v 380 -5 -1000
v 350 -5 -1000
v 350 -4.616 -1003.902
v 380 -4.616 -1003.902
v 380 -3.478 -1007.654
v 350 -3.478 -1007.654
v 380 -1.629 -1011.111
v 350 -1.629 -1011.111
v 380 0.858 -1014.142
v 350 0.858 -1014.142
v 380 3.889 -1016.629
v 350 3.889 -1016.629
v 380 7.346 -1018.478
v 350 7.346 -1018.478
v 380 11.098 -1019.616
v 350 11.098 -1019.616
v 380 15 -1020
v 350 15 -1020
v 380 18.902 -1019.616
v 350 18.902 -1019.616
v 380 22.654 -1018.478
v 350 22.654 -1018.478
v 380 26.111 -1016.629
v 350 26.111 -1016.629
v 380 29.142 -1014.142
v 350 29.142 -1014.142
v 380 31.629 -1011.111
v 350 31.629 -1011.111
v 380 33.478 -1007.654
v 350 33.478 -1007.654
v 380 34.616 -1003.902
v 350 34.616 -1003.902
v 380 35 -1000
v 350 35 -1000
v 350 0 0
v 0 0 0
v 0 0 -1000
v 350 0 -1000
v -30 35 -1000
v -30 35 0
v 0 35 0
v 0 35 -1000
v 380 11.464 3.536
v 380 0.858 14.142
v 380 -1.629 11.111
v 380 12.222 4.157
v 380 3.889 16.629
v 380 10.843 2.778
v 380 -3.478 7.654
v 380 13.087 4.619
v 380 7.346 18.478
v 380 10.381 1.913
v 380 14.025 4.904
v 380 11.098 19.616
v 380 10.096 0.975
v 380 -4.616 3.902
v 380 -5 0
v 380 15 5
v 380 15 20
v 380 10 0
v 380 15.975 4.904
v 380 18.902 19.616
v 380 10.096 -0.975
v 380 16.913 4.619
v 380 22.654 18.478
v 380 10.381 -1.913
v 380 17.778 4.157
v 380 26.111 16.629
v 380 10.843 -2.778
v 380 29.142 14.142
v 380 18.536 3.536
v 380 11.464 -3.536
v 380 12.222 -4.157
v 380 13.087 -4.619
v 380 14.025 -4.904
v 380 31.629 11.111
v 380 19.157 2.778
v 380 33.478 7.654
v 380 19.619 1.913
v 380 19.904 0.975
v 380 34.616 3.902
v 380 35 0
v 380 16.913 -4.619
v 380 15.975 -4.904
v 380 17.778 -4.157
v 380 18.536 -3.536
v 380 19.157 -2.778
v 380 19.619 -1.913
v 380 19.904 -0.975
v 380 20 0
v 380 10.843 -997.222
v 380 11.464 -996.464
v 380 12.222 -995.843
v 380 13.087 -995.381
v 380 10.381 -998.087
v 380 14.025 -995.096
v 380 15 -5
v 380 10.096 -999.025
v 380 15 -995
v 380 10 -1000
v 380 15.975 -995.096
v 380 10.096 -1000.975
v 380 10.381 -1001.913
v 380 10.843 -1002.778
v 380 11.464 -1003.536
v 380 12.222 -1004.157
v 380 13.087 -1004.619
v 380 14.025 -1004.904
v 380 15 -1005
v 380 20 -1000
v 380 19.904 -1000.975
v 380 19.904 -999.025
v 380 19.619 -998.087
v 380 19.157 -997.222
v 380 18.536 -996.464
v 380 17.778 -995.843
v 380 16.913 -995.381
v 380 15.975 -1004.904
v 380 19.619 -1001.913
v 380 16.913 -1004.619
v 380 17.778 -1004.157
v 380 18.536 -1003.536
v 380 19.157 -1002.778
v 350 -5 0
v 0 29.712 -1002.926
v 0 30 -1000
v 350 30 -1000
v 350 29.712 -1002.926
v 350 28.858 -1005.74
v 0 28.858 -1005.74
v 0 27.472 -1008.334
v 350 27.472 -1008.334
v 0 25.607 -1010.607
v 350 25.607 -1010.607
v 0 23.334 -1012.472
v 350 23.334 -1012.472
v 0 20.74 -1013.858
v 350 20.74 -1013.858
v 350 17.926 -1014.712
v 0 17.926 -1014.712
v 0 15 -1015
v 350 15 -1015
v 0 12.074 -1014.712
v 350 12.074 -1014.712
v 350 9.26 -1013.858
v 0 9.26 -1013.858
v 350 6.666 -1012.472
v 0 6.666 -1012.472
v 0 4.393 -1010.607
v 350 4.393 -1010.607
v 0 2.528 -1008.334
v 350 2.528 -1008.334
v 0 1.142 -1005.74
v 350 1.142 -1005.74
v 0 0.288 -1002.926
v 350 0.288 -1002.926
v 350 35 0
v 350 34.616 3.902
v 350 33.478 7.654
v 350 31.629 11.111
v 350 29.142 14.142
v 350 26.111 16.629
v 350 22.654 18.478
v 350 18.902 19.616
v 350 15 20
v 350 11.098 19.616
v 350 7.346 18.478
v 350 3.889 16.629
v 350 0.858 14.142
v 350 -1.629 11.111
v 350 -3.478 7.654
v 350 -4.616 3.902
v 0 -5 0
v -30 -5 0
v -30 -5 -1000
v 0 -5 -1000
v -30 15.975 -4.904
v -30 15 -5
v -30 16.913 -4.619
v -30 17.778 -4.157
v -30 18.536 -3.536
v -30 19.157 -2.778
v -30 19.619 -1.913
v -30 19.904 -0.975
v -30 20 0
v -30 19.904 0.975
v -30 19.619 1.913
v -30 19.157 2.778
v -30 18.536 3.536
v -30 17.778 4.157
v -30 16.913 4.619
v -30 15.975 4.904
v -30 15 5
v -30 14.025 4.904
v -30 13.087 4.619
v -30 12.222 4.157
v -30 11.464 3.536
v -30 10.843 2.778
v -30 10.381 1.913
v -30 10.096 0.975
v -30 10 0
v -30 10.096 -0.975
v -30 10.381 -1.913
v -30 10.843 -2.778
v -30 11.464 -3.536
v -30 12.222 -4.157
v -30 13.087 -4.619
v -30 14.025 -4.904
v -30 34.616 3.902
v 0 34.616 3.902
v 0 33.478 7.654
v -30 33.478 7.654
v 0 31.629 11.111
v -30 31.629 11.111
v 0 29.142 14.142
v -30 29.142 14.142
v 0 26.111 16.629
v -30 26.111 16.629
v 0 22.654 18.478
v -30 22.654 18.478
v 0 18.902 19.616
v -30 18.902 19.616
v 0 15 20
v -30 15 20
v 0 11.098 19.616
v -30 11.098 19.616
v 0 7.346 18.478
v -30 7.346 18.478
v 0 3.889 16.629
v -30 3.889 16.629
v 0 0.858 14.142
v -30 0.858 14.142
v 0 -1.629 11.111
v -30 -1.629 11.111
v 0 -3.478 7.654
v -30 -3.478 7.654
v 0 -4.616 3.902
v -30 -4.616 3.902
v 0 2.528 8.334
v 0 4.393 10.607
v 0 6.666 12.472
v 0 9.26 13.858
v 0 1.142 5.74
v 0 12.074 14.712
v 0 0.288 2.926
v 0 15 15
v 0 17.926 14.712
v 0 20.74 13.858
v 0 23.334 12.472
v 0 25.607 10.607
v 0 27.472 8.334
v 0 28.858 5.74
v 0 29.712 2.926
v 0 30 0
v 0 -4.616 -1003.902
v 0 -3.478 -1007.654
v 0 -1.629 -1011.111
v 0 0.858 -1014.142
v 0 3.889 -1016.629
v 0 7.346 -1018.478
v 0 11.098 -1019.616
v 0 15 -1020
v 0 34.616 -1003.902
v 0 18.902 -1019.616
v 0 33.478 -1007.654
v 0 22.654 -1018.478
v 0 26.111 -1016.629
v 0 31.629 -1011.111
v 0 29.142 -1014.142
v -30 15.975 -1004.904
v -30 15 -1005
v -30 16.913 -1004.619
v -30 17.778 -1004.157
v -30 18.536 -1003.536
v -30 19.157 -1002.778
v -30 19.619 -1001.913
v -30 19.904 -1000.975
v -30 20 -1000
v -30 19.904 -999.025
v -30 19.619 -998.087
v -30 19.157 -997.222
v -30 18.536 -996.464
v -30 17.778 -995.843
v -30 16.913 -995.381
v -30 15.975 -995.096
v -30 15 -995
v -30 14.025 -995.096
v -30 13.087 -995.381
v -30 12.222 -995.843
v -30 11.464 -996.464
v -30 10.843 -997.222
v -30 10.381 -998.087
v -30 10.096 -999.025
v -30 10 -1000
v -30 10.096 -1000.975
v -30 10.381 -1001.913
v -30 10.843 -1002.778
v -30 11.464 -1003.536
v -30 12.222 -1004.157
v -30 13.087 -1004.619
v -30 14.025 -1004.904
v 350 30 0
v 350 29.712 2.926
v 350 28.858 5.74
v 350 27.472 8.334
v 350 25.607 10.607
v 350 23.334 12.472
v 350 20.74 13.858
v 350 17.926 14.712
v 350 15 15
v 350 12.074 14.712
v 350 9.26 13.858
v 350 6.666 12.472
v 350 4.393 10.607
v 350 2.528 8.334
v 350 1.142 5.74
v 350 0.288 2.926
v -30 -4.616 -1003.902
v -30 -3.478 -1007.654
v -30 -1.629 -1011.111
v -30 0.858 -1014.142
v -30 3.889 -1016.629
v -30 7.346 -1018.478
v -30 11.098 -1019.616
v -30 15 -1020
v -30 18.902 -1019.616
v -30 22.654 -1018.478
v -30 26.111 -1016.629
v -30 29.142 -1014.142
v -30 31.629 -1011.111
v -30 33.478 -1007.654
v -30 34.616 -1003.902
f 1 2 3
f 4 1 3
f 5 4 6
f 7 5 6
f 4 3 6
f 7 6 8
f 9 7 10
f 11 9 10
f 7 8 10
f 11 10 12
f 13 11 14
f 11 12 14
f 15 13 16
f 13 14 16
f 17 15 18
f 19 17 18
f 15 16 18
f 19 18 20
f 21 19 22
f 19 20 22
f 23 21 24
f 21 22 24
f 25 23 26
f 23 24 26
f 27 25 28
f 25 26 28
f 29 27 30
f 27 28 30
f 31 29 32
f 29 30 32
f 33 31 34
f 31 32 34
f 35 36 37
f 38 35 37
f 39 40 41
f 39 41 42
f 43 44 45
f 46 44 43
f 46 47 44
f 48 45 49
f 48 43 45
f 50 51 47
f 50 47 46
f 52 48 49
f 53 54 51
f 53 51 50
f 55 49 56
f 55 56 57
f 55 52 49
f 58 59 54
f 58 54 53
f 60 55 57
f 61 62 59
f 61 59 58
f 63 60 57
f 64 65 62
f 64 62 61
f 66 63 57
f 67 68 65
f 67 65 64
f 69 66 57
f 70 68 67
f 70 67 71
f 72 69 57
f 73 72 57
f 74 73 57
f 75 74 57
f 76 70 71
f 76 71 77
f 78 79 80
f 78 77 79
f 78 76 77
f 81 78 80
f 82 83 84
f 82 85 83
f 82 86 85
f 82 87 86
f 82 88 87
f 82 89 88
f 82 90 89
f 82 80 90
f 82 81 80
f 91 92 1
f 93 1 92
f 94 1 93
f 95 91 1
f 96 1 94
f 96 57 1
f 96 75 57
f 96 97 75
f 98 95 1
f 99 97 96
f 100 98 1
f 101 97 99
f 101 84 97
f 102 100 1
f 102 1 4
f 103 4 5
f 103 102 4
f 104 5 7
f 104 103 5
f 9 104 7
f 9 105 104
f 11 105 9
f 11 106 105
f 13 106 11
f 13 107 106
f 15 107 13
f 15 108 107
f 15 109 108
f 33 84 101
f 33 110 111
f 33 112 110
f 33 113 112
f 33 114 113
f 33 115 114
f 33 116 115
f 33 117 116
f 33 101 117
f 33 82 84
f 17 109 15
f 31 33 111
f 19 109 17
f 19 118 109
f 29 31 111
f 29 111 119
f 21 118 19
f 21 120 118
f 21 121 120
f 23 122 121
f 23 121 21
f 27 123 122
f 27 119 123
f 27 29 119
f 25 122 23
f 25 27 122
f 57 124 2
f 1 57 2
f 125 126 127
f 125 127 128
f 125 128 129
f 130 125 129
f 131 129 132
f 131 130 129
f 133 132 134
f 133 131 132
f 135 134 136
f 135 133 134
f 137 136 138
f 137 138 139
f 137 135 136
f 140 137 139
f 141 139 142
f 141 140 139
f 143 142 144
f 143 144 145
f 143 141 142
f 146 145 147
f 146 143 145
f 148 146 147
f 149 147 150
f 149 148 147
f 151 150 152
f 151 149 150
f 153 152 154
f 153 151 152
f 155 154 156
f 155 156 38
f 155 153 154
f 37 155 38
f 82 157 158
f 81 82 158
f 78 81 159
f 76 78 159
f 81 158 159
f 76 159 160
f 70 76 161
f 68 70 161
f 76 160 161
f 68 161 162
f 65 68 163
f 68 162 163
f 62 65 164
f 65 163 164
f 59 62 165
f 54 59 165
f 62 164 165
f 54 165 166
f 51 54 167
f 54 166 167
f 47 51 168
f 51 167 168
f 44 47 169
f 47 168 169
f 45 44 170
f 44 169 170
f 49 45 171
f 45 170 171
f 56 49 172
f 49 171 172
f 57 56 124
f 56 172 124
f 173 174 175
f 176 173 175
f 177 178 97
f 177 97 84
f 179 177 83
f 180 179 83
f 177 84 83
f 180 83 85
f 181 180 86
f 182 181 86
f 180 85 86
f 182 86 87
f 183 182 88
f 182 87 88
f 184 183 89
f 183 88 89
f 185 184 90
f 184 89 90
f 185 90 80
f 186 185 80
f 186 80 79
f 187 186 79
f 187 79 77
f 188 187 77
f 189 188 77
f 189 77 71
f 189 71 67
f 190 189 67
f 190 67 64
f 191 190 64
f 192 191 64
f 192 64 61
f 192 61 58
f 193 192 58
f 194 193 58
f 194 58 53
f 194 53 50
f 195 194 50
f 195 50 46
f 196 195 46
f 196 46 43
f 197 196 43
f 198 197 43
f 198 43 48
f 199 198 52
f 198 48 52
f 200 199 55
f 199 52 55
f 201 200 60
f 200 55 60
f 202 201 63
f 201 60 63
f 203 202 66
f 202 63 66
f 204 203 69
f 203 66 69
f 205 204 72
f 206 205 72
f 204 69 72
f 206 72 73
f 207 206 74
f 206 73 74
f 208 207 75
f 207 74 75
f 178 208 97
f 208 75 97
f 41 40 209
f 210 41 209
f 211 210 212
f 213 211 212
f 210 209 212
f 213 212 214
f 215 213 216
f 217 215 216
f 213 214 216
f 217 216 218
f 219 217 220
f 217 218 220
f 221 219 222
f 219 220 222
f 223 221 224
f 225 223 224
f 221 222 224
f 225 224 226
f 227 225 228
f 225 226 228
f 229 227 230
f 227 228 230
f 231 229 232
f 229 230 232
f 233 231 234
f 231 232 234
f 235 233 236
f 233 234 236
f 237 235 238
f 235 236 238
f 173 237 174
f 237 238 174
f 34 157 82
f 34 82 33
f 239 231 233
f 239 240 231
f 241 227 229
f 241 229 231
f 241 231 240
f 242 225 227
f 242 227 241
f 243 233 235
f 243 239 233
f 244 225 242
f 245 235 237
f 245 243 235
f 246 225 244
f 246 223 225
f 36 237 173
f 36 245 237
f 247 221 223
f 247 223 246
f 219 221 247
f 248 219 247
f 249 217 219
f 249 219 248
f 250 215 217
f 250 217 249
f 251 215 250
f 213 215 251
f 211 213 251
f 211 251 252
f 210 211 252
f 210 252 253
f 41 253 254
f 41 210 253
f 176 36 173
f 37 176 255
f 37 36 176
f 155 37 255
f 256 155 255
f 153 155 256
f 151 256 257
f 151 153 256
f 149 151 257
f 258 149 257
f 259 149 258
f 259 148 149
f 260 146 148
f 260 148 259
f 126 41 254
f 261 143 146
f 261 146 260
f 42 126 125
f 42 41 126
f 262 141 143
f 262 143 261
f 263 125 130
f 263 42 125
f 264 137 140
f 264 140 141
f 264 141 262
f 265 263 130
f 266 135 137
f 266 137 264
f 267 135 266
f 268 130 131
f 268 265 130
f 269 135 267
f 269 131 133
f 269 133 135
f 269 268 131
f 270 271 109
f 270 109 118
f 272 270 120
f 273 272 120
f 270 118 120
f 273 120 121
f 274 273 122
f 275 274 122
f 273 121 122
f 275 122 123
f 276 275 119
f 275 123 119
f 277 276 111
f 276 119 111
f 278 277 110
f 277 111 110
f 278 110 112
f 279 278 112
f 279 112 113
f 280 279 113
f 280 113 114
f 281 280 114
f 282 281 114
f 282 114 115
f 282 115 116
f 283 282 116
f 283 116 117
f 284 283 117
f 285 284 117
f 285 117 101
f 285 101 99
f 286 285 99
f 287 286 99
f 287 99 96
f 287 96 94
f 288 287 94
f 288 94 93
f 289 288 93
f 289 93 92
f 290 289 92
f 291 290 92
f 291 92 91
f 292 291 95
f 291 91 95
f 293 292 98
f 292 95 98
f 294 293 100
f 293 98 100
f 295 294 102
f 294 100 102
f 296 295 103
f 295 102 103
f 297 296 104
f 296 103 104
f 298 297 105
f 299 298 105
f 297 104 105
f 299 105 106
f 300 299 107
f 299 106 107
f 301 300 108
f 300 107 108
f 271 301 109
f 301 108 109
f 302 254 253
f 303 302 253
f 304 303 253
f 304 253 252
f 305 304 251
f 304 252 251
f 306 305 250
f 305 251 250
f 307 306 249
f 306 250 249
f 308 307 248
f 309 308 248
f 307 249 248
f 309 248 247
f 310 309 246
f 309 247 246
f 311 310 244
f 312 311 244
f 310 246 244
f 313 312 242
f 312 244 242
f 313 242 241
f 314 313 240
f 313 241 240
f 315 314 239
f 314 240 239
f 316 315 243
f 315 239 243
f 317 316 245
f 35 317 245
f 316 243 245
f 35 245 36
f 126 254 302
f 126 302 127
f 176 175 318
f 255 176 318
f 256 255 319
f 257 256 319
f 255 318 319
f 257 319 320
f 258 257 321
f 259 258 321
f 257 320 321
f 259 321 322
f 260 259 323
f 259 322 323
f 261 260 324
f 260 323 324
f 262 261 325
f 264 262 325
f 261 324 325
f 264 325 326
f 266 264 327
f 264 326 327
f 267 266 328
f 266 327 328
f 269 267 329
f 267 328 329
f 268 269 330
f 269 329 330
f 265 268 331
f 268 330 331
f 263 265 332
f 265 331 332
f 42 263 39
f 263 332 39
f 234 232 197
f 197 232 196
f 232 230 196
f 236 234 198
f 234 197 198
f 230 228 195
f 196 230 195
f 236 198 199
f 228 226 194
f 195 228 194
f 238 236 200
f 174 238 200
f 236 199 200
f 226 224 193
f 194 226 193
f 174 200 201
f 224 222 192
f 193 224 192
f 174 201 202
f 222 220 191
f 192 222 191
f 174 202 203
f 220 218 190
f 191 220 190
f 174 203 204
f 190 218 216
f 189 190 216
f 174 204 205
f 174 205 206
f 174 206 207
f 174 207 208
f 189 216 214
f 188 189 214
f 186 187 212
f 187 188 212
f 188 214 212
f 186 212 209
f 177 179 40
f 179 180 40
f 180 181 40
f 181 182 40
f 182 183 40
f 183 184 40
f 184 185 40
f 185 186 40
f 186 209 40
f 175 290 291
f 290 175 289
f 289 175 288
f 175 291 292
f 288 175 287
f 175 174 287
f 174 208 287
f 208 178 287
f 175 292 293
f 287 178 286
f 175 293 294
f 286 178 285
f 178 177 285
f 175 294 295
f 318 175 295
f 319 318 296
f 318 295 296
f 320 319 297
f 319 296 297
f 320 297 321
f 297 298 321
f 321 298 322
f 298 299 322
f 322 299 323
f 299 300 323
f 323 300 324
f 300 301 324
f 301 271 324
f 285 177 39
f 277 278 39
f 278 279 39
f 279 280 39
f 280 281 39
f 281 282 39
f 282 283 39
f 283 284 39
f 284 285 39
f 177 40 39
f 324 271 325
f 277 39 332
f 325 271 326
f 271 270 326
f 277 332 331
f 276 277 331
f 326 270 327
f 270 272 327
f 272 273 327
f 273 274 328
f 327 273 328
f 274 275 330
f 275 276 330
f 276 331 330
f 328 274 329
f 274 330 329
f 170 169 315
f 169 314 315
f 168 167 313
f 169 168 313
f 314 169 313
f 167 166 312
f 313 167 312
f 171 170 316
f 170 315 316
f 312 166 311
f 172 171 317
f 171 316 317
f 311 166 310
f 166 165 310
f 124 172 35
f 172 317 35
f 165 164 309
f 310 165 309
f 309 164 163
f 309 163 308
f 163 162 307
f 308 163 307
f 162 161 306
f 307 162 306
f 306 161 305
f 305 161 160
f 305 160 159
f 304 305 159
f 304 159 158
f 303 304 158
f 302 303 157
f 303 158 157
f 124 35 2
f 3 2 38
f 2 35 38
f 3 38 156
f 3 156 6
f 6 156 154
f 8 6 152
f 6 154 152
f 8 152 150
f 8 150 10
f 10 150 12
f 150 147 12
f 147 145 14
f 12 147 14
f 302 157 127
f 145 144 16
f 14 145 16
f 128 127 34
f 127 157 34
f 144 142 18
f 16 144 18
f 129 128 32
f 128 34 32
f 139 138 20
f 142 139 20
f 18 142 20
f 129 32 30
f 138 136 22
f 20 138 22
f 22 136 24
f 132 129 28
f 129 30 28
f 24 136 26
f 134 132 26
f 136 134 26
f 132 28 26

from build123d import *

# Parameters (mm, degrees)
BOSS_EXTRUDE1_DEPTH = 350
BOSS_EXTRUDE2_DEPTH = 30
LPATTERN1_COUNT     = 2
LPATTERN1_PITCH     = 380
SKETCH3_R           = 5
CUT_EXTRUDE1_DEPTH  = 1100.874992897


with BuildPart() as part:
    # Sketch1 → Boss-Extrude1 (new body)
    with BuildSketch(Plane(origin=(0, 0, 0), x_dir=(0, 0, -1), z_dir=(1, 0, 0))):
        with BuildLine():
            Line((1000, 30), (0, 30))
            ThreePointArc((0, 30), (-15, 15), (0, 0))
            Line((0, 0), (1000, 0))
            ThreePointArc((1000, 0), (1015, 15), (1000, 30))
        make_face()
    extrude(amount=BOSS_EXTRUDE1_DEPTH)

    # Sketch2 → Boss-Extrude2 (add)
    with BuildSketch(Plane(origin=(350, 0, 0), x_dir=(0, 0, -1), z_dir=(1, 0, 0))):
        with BuildLine():
            Line((0, -5), (1000, -5))
            ThreePointArc((1000, -5), (1020, 15), (1000, 35))
            Line((1000, 35), (0, 35))
            ThreePointArc((0, 35), (-20, 15), (0, -5))
        make_face()
    boss_extrude2 = extrude(amount=BOSS_EXTRUDE2_DEPTH)

    # LPattern1: Boss-Extrude2 ×2
    with Locations(*[(-i * LPATTERN1_PITCH, 0, 0) for i in range(1, LPATTERN1_COUNT)]):
        add(boss_extrude2)

    # Sketch3 → Cut-Extrude1 (cut, through all)
    with BuildSketch(Plane(origin=(380, 0, 0), x_dir=(0, 0, -1), z_dir=(1, 0, 0))):
        with Locations((0, 15)):
            Circle(SKETCH3_R)
        with Locations((1000, 15)):
            Circle(SKETCH3_R)
    extrude(amount=-CUT_EXTRUDE1_DEPTH, mode=Mode.SUBTRACT)


solid = part.part
